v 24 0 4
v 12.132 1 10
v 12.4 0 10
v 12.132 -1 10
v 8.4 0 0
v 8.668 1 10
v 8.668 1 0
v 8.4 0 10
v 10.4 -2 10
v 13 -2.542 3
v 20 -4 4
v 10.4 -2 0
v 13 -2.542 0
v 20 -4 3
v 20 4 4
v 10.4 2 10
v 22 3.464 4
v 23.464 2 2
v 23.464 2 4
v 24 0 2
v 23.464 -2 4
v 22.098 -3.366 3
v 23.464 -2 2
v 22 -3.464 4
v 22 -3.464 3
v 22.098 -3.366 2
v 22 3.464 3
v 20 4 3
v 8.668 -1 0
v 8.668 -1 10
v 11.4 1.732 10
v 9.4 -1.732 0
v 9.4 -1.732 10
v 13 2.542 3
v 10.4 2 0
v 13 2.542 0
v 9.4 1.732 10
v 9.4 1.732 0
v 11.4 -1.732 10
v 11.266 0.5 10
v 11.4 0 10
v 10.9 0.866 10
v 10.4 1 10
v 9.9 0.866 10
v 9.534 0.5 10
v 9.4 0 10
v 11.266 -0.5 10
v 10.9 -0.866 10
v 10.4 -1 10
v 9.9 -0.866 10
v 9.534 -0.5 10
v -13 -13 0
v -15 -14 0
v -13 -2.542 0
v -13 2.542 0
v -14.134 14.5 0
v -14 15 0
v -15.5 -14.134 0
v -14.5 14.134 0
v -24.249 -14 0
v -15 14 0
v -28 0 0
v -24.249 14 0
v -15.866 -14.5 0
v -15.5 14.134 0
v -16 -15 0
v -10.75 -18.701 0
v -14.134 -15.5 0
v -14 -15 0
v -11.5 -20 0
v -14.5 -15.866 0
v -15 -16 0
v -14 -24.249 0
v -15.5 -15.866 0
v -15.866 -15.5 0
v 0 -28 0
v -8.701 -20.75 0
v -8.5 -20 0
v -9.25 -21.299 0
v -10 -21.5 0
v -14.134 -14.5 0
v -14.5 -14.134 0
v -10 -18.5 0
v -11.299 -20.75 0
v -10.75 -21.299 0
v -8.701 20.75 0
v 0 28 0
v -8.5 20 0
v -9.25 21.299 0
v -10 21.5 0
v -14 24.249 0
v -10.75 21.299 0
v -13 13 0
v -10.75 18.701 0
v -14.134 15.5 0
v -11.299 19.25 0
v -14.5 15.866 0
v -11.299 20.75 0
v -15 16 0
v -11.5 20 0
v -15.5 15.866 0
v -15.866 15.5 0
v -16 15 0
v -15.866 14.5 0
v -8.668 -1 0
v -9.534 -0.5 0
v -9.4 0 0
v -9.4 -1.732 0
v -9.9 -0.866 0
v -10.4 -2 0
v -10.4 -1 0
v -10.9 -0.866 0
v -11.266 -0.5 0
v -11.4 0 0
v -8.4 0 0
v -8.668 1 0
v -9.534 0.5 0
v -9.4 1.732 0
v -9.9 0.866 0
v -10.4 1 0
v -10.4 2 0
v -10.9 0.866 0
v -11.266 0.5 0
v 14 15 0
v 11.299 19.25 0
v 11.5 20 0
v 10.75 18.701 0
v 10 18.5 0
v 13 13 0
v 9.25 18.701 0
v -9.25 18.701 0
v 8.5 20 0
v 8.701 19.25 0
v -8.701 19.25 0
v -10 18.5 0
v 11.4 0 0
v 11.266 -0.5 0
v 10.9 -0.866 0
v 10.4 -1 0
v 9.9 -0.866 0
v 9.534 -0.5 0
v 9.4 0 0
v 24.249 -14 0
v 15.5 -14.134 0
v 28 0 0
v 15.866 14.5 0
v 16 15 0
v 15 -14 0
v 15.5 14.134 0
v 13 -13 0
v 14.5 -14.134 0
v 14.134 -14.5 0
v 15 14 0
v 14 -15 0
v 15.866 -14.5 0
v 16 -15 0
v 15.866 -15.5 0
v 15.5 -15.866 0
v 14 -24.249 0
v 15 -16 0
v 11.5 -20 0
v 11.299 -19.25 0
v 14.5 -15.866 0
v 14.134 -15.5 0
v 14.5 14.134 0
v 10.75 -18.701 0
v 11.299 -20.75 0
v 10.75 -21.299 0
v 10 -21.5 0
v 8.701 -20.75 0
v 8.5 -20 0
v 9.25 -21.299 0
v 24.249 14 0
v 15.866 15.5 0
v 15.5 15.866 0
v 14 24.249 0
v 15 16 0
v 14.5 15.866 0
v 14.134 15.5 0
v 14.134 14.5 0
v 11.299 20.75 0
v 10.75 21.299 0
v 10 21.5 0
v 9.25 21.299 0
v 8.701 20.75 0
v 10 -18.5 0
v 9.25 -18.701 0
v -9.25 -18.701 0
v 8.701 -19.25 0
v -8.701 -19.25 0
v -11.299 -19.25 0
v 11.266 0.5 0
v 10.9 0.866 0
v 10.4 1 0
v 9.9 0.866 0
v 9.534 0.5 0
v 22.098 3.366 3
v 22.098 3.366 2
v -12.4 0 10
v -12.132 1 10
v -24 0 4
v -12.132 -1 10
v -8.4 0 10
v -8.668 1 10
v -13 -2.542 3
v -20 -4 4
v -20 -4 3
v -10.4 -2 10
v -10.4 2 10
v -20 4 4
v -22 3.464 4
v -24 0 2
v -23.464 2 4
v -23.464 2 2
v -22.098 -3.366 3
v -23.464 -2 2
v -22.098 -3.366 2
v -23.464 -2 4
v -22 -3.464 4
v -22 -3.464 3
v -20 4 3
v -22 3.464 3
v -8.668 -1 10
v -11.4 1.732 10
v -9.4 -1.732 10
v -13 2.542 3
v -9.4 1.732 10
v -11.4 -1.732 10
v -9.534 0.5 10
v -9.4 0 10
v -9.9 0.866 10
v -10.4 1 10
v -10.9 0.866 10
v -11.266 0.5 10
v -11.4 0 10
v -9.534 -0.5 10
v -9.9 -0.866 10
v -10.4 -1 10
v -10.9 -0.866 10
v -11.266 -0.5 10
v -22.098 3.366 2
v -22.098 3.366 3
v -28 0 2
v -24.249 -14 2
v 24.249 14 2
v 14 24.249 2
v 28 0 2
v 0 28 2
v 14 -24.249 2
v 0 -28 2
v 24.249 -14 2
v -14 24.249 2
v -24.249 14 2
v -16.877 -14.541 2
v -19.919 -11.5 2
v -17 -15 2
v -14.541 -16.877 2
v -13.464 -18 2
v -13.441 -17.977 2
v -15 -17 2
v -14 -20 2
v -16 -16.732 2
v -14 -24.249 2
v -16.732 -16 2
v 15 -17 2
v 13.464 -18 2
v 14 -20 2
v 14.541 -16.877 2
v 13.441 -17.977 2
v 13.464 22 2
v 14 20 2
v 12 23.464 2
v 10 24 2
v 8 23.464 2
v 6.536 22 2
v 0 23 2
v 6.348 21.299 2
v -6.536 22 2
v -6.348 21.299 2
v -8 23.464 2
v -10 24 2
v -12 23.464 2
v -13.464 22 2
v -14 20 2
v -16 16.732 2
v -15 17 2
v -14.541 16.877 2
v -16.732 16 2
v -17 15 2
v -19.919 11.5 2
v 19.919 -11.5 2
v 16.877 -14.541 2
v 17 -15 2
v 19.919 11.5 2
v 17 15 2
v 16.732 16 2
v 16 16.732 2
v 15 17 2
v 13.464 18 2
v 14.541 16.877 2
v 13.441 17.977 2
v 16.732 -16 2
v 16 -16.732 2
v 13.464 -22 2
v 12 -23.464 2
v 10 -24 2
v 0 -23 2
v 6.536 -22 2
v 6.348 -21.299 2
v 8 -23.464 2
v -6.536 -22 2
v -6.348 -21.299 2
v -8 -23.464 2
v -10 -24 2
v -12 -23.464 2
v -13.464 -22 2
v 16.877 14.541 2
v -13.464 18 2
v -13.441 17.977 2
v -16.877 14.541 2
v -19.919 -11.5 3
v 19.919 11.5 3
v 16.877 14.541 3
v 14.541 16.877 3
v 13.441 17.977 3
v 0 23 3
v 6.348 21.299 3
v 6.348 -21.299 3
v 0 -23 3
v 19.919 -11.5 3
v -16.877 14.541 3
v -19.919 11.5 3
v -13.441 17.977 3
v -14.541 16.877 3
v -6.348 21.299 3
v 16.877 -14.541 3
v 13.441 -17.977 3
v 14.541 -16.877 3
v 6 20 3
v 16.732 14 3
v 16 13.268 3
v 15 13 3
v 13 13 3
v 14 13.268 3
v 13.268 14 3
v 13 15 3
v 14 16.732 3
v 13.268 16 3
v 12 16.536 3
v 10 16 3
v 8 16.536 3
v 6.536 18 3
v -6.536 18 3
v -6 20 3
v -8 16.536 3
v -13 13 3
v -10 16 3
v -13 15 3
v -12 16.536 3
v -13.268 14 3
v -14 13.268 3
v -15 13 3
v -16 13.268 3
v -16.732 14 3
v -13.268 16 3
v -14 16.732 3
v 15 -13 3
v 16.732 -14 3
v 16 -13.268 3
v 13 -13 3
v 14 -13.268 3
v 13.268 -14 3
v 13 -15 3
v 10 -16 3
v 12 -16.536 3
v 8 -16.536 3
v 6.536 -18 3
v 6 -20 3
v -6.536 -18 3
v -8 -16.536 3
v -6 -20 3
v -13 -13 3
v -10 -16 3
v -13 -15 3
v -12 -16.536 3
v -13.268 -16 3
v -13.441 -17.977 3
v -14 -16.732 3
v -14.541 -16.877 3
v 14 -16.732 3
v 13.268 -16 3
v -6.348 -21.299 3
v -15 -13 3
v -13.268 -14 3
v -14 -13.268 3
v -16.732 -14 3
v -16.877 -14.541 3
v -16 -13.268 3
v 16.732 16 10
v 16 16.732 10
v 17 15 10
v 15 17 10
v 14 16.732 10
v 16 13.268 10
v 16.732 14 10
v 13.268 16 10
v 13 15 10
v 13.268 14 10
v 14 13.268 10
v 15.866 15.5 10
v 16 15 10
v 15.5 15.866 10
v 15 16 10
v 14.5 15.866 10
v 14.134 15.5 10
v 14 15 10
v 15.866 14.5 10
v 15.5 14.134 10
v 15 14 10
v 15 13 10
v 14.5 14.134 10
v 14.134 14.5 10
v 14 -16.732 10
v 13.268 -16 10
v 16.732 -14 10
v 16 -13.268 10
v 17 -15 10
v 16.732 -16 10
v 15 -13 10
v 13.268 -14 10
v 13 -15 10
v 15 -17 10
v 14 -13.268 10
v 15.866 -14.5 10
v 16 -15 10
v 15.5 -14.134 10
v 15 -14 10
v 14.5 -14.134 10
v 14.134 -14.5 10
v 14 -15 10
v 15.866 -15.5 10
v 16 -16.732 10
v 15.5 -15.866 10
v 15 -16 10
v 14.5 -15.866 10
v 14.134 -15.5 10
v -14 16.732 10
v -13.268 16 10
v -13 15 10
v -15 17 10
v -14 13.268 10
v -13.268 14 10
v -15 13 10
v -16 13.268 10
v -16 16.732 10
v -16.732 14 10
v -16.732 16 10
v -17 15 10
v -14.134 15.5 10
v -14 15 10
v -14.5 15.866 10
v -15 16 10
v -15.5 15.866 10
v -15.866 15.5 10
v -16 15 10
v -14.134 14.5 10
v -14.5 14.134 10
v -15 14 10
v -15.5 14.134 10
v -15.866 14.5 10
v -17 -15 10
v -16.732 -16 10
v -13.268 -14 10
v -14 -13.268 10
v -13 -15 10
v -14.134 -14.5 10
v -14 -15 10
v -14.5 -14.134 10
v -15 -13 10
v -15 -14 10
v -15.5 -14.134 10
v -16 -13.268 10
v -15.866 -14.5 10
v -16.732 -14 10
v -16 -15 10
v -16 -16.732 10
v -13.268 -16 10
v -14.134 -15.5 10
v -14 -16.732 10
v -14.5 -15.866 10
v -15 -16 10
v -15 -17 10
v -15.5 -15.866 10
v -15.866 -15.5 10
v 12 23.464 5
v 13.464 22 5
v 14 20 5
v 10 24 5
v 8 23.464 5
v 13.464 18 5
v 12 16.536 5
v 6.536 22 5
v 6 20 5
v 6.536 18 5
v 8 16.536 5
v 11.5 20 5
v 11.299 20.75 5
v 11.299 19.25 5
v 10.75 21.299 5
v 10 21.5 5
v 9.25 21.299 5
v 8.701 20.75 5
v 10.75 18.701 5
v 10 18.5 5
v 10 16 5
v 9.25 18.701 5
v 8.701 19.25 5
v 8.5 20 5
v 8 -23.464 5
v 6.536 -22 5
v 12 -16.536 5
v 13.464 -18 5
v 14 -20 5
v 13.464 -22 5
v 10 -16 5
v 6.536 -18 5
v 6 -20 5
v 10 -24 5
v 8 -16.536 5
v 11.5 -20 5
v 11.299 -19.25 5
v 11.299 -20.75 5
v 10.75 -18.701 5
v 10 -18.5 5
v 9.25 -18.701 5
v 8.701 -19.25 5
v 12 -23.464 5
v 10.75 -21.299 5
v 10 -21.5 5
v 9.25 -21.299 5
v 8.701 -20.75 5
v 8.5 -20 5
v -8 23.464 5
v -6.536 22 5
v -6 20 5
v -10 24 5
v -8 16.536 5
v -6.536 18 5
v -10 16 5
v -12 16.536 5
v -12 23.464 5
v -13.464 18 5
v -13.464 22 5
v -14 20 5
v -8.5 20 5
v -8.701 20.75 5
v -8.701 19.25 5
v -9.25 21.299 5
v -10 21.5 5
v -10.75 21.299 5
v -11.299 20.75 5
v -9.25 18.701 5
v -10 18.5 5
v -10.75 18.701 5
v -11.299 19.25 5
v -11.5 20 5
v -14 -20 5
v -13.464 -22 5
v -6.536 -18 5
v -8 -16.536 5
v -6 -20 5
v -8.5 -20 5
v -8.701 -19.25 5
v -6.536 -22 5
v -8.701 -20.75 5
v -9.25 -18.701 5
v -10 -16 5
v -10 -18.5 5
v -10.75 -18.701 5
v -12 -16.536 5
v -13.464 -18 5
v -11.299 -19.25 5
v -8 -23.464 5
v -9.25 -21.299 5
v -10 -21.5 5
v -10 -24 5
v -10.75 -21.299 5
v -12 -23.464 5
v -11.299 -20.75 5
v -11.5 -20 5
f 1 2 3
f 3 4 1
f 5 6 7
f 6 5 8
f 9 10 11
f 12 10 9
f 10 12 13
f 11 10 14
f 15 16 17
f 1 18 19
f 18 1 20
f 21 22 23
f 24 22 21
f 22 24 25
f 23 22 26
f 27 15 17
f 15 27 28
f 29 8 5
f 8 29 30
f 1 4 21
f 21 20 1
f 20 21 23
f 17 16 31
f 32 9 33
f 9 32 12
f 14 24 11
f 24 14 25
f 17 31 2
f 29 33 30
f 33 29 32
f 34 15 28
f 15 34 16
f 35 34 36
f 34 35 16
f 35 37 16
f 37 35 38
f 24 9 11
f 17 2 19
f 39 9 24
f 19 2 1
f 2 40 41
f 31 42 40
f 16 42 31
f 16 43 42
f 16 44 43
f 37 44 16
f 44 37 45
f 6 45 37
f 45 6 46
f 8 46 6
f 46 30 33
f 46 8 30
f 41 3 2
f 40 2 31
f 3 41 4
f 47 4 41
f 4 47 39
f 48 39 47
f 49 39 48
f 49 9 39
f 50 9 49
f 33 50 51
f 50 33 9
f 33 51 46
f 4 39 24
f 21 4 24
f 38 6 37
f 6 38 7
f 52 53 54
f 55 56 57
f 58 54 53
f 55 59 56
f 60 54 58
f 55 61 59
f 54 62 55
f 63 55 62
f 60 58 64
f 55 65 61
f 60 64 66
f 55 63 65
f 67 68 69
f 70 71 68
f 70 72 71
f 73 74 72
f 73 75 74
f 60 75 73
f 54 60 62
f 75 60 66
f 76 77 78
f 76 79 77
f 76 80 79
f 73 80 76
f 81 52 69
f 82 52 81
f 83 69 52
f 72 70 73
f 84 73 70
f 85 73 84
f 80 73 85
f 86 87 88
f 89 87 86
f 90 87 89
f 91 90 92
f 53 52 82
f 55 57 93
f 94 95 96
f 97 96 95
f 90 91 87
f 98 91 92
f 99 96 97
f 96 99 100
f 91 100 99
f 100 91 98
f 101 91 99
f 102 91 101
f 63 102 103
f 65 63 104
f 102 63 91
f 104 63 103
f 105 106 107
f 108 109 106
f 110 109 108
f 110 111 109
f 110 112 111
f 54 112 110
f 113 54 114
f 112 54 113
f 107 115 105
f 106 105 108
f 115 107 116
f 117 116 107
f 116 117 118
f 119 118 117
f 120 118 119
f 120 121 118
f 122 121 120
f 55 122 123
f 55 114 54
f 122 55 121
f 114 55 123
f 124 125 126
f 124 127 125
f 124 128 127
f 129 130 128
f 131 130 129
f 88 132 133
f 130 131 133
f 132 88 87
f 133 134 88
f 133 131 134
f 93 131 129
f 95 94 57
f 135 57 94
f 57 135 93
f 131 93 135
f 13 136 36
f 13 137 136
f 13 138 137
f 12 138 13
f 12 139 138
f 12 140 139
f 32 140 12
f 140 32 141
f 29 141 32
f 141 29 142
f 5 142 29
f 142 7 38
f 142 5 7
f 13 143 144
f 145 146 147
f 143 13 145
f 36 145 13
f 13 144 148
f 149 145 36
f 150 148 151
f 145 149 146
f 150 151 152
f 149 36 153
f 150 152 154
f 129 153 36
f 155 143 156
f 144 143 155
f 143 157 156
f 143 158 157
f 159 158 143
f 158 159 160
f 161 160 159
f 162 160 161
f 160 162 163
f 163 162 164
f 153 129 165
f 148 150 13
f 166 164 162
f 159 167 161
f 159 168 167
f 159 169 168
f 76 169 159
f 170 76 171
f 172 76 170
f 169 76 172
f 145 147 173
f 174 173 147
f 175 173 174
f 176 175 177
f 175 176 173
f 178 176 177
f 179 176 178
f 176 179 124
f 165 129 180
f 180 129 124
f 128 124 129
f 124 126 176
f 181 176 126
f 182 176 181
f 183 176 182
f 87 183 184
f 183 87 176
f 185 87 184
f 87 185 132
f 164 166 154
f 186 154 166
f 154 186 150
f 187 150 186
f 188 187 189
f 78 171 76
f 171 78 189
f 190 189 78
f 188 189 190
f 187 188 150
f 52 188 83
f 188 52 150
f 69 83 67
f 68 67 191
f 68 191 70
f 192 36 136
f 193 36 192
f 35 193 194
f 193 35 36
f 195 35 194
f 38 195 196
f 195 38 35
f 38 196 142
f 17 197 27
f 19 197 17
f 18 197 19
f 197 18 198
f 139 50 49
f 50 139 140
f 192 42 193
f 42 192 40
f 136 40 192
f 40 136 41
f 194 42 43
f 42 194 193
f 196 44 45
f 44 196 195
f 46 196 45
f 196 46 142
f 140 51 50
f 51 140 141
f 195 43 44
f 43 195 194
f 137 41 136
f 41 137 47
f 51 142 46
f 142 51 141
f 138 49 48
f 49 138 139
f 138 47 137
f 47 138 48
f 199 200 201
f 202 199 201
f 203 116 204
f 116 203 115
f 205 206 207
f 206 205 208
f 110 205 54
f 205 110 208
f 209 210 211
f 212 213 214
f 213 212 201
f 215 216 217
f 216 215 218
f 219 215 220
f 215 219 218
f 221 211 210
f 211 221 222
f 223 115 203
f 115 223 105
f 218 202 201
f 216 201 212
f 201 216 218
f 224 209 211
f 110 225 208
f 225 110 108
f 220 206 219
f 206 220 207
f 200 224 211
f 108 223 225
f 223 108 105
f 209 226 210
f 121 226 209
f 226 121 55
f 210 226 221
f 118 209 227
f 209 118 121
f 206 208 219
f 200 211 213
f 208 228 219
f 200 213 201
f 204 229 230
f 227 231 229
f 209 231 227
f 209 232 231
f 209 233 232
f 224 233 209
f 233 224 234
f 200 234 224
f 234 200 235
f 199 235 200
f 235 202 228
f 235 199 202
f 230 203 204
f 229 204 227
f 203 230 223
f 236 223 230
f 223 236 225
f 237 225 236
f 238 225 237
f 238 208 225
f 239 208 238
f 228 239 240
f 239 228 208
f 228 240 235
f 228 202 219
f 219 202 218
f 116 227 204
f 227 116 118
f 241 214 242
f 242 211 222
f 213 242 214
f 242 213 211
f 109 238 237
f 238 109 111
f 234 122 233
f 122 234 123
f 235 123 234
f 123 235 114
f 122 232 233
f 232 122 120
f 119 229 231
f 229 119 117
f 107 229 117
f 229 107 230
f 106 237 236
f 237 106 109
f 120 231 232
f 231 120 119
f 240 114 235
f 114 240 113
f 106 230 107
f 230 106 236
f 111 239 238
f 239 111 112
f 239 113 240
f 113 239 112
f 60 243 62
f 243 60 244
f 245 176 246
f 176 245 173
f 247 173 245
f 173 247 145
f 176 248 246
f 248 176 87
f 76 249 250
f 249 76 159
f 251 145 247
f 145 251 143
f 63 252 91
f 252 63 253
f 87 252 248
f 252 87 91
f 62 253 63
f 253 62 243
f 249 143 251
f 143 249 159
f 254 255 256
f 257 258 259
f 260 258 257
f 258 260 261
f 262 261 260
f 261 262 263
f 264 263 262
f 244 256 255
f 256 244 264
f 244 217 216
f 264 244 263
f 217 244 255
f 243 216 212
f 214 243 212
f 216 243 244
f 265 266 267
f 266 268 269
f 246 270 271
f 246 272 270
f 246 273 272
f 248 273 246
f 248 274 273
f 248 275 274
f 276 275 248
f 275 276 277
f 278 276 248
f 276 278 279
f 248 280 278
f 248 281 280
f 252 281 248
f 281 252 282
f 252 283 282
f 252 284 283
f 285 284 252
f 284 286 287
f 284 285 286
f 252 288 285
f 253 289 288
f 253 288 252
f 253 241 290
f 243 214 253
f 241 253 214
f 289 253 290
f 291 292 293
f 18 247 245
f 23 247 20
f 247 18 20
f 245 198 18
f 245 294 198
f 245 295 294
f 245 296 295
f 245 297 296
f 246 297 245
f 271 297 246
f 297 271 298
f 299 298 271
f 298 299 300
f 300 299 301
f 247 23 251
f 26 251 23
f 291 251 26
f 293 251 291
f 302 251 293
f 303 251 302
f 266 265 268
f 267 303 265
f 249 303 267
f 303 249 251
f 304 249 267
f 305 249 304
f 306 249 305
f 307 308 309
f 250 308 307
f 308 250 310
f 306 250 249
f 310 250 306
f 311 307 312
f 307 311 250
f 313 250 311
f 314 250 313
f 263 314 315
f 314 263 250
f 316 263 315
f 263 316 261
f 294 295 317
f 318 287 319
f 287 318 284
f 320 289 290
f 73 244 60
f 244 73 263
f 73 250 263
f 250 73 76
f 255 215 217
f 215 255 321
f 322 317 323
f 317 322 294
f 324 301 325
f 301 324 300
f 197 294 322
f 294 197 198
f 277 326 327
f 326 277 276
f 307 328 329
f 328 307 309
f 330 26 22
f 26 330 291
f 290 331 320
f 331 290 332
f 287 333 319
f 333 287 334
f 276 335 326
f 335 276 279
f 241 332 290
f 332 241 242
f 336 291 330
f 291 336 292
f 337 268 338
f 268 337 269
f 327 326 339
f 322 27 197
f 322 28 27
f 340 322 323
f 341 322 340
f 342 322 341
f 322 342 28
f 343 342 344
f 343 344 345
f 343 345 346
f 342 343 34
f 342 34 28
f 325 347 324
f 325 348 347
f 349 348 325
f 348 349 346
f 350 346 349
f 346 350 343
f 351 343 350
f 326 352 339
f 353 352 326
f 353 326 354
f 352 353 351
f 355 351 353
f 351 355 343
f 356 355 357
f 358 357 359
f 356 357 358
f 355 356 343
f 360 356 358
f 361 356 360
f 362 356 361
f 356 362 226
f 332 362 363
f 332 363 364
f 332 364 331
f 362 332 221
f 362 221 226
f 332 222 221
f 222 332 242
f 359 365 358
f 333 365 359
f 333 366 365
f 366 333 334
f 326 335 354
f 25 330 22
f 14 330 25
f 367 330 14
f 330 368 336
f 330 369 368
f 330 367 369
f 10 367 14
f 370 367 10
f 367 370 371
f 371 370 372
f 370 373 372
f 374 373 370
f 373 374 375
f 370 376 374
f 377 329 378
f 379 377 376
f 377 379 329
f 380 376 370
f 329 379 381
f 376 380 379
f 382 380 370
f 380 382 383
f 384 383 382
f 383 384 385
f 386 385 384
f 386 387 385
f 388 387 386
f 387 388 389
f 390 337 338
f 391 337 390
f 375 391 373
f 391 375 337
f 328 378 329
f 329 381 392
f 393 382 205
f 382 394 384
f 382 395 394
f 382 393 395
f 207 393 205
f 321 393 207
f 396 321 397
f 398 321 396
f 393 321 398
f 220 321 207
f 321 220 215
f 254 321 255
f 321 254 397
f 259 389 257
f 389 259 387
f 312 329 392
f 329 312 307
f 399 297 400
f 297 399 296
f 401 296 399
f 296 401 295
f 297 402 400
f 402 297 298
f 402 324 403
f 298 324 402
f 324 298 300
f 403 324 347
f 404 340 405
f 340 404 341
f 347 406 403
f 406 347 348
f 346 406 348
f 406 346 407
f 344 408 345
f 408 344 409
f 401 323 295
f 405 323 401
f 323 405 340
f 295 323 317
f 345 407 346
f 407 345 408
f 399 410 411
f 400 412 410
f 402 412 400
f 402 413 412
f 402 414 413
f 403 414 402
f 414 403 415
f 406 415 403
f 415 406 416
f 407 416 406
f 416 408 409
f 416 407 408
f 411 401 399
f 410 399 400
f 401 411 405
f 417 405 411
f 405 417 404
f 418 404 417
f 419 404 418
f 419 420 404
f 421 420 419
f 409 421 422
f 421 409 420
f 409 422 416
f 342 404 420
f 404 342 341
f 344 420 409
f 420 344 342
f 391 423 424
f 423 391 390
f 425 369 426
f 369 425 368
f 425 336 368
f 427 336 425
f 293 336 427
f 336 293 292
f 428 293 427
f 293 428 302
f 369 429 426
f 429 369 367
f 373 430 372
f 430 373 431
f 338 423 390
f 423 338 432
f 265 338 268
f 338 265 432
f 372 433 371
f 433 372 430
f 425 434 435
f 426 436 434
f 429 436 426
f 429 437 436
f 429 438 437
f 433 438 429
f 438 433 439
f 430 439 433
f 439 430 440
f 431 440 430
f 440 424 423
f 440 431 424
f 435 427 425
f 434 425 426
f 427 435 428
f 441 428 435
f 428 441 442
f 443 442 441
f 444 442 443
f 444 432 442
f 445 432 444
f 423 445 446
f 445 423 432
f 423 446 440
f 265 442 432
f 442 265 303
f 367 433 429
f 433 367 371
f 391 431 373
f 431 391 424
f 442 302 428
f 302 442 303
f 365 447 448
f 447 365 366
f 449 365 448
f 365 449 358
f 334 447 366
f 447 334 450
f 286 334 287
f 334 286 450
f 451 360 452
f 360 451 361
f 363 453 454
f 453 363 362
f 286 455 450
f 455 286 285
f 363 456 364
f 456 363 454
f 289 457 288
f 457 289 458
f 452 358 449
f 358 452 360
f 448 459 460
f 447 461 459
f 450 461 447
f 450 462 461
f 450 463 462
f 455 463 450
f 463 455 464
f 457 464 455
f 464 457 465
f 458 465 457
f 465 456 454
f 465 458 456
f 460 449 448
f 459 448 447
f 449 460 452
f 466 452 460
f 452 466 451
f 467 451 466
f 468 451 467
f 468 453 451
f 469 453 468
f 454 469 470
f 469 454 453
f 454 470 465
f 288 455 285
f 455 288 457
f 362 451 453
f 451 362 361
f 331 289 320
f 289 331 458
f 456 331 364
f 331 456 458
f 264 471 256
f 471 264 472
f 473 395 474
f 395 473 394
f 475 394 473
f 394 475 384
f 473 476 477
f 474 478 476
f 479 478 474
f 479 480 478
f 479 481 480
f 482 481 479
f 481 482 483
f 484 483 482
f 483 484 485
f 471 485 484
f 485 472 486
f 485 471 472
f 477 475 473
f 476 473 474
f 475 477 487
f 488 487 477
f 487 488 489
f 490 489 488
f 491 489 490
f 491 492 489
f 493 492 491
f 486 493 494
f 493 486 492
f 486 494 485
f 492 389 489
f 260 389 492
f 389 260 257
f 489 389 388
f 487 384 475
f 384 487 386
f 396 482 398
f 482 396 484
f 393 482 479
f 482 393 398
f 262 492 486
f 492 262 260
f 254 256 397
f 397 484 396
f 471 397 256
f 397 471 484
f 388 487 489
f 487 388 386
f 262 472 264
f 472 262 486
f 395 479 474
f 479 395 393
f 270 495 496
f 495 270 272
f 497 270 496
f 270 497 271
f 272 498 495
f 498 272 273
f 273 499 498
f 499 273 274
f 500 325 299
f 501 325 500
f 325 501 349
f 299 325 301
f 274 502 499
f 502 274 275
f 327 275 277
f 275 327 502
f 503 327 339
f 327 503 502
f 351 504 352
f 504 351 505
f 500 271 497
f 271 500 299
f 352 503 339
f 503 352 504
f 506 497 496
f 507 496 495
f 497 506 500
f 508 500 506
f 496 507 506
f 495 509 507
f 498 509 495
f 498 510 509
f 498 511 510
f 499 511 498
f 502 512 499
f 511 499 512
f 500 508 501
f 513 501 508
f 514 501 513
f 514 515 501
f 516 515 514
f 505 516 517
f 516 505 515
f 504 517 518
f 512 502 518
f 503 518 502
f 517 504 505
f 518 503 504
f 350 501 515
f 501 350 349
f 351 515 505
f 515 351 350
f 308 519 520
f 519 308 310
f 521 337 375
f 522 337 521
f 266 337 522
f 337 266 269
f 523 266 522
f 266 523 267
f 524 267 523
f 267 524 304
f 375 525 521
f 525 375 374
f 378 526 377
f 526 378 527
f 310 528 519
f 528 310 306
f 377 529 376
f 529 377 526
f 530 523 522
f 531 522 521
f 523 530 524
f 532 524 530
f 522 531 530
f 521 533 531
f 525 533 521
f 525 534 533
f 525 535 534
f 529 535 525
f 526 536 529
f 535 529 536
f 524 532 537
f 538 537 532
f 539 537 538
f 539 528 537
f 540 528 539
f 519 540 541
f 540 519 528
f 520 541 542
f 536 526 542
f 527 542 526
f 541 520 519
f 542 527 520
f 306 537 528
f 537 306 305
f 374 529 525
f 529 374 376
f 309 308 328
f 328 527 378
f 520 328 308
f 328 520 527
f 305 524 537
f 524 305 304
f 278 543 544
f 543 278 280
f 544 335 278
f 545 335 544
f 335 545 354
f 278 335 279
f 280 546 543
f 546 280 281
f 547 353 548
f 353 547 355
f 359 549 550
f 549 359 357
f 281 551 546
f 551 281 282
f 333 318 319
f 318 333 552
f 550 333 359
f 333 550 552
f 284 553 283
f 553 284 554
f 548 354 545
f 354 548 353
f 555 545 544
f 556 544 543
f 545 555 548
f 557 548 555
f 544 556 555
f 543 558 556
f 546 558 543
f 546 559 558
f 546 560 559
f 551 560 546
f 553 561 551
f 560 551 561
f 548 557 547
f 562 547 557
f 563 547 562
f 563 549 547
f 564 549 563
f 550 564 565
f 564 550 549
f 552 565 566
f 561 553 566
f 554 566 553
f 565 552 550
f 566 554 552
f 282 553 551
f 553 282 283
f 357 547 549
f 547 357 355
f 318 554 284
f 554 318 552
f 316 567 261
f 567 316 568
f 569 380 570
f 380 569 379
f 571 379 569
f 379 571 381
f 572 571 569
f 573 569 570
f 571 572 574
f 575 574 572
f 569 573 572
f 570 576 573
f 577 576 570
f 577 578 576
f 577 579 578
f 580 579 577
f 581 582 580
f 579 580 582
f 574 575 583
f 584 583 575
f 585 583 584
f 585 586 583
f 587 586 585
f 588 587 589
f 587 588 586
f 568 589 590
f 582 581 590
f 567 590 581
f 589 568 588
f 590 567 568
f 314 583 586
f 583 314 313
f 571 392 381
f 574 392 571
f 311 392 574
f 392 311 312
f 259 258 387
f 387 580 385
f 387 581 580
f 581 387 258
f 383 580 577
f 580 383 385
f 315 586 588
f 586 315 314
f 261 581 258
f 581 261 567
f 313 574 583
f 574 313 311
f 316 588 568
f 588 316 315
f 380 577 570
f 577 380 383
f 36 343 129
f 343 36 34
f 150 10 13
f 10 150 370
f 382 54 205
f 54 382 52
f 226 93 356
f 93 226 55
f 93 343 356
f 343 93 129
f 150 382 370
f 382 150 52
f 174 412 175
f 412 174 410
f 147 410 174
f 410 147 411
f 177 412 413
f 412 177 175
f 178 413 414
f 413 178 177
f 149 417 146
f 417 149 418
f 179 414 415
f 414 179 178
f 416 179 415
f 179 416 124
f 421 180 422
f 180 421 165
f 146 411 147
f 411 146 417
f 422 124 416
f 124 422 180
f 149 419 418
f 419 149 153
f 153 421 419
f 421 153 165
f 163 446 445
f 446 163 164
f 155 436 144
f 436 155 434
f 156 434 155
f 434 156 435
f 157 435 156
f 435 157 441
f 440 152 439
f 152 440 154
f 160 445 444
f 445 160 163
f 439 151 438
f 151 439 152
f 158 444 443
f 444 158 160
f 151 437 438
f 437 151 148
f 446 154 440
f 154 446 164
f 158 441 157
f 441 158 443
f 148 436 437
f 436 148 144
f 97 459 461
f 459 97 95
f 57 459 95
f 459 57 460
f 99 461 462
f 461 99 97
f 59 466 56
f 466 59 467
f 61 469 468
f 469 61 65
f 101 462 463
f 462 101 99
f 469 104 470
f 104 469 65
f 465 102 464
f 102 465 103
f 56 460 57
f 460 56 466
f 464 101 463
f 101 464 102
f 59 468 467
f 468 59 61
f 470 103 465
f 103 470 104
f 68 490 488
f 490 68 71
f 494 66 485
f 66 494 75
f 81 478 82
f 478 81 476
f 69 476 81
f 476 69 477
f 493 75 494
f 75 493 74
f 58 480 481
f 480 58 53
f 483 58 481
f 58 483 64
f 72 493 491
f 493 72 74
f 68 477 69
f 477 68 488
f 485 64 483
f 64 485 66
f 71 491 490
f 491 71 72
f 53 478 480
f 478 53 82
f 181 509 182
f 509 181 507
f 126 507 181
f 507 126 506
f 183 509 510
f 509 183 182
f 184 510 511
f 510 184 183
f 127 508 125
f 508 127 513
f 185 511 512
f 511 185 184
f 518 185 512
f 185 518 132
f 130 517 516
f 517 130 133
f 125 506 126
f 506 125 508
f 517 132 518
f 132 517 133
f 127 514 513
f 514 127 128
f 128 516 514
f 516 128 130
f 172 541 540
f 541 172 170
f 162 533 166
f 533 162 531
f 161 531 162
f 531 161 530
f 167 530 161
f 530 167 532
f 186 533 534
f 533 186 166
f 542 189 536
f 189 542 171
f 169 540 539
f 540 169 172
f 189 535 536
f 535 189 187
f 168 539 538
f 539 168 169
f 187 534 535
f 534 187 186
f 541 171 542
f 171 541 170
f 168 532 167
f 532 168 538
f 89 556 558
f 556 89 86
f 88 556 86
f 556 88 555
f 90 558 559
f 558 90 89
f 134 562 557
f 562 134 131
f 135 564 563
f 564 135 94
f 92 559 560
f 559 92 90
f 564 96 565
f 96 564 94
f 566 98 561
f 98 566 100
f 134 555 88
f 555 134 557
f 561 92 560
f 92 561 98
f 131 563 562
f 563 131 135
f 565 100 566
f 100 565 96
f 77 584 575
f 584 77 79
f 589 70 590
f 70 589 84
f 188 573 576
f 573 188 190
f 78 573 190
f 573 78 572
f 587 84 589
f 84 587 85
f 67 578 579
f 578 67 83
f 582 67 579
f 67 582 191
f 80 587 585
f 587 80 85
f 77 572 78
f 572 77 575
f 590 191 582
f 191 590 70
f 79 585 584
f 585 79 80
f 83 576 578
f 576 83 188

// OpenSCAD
//This camera mount is to go on the back of either V2 or HQ raspberry pi camera module.
//The mounting is from the back to allow modification (e.g. different lenses) to the front
//it's pretty crude and simple but is intended to be a drop-in module for more complex systems e.g. darkfield illumination system to measure light scattering from cells in microdevices.


//parameters varibales and spacing
lugx=10;
lugy=20;
$fn=12;
    // HQ holes are 4mm from edge of 38mm square; i.e. 38/2-4 mm from centrepoint 19-4=15mm 
HQmount=15;

//LUGS for camera v2 board
module lugs(){
difference(){
hull(){
translate([10.4,0,0]) cylinder(d=4,h=10);
translate([20,0,0]) cylinder(d=8,h=4);
}
translate([10.4,0,-50]) cylinder(d=2,h=100);
}
}
    
module boardmount2(depth=4,pi2=true) {
union(){
//FIRST LUGS FOR CAMERA v2 BOARD has 2.2mm mounting holes; can comment out for HQ camera
if(pi2){

lugs();
mirror([1,0,0]){
    lugs();
}
}
//THEN PLATE FOR MOUNTING
difference(){
union(){
    //base plate (can be various shapes)
translate([0,0,0]) cylinder(d=56,h=2);
translate([0,0,0]) cylinder(d=46,h=3);    
//add lugs for HQ camera    

translate([HQmount,HQmount,0]) cylinder(r=2,h=10);
translate([HQmount,-HQmount,0]) cylinder(r=2,h=10);
translate([-HQmount,HQmount,0]) cylinder(r=2,h=10);
translate([-HQmount,-HQmount,0]) cylinder(r=2,h=10);  
    
//add lugs for mounting
    // start with 20mm x 40mm grid for mounts
 
translate([lugx,lugy,0]) cylinder(d=8,h=5);
translate([lugx,-lugy,0]) cylinder(d=8,h=5);
translate([-lugx,lugy,0]) cylinder(d=8,h=5);
translate([-lugx,-lugy,0]) cylinder(d=8,h=5);  
}


translate([-13,-13,-50]) cube([26,26,100]); //space for camera
    //ADD 2mm HOLES FOR HQ camera- PCB has 2.5mm mounting holes 
translate([HQmount,HQmount,-50]) cylinder(d=2,h=100);
translate([HQmount,-HQmount,-50]) cylinder(d=2,h=100);
translate([-HQmount,HQmount,-50]) cylinder(d=2,h=100);
translate([-HQmount,-HQmount,-50]) cylinder(d=2,h=100);

    //ADD 3mm HOLES FOR mounting
translate([lugx,lugy,-50]) cylinder(d=3,h=100);
translate([lugx,-lugy,-50]) cylinder(d=3,h=100);
translate([-lugx,lugy,-50]) cylinder(d=3,h=100);
translate([-lugx,-lugy,-50]) cylinder(d=3,h=100);


}
}

}

//Bolt check
//translate([-HQmount,-HQmount,-50]) cylinder(r=1,h=100,$fn=120);


boardmount2(); 
//boardmount2(pi2=false);
